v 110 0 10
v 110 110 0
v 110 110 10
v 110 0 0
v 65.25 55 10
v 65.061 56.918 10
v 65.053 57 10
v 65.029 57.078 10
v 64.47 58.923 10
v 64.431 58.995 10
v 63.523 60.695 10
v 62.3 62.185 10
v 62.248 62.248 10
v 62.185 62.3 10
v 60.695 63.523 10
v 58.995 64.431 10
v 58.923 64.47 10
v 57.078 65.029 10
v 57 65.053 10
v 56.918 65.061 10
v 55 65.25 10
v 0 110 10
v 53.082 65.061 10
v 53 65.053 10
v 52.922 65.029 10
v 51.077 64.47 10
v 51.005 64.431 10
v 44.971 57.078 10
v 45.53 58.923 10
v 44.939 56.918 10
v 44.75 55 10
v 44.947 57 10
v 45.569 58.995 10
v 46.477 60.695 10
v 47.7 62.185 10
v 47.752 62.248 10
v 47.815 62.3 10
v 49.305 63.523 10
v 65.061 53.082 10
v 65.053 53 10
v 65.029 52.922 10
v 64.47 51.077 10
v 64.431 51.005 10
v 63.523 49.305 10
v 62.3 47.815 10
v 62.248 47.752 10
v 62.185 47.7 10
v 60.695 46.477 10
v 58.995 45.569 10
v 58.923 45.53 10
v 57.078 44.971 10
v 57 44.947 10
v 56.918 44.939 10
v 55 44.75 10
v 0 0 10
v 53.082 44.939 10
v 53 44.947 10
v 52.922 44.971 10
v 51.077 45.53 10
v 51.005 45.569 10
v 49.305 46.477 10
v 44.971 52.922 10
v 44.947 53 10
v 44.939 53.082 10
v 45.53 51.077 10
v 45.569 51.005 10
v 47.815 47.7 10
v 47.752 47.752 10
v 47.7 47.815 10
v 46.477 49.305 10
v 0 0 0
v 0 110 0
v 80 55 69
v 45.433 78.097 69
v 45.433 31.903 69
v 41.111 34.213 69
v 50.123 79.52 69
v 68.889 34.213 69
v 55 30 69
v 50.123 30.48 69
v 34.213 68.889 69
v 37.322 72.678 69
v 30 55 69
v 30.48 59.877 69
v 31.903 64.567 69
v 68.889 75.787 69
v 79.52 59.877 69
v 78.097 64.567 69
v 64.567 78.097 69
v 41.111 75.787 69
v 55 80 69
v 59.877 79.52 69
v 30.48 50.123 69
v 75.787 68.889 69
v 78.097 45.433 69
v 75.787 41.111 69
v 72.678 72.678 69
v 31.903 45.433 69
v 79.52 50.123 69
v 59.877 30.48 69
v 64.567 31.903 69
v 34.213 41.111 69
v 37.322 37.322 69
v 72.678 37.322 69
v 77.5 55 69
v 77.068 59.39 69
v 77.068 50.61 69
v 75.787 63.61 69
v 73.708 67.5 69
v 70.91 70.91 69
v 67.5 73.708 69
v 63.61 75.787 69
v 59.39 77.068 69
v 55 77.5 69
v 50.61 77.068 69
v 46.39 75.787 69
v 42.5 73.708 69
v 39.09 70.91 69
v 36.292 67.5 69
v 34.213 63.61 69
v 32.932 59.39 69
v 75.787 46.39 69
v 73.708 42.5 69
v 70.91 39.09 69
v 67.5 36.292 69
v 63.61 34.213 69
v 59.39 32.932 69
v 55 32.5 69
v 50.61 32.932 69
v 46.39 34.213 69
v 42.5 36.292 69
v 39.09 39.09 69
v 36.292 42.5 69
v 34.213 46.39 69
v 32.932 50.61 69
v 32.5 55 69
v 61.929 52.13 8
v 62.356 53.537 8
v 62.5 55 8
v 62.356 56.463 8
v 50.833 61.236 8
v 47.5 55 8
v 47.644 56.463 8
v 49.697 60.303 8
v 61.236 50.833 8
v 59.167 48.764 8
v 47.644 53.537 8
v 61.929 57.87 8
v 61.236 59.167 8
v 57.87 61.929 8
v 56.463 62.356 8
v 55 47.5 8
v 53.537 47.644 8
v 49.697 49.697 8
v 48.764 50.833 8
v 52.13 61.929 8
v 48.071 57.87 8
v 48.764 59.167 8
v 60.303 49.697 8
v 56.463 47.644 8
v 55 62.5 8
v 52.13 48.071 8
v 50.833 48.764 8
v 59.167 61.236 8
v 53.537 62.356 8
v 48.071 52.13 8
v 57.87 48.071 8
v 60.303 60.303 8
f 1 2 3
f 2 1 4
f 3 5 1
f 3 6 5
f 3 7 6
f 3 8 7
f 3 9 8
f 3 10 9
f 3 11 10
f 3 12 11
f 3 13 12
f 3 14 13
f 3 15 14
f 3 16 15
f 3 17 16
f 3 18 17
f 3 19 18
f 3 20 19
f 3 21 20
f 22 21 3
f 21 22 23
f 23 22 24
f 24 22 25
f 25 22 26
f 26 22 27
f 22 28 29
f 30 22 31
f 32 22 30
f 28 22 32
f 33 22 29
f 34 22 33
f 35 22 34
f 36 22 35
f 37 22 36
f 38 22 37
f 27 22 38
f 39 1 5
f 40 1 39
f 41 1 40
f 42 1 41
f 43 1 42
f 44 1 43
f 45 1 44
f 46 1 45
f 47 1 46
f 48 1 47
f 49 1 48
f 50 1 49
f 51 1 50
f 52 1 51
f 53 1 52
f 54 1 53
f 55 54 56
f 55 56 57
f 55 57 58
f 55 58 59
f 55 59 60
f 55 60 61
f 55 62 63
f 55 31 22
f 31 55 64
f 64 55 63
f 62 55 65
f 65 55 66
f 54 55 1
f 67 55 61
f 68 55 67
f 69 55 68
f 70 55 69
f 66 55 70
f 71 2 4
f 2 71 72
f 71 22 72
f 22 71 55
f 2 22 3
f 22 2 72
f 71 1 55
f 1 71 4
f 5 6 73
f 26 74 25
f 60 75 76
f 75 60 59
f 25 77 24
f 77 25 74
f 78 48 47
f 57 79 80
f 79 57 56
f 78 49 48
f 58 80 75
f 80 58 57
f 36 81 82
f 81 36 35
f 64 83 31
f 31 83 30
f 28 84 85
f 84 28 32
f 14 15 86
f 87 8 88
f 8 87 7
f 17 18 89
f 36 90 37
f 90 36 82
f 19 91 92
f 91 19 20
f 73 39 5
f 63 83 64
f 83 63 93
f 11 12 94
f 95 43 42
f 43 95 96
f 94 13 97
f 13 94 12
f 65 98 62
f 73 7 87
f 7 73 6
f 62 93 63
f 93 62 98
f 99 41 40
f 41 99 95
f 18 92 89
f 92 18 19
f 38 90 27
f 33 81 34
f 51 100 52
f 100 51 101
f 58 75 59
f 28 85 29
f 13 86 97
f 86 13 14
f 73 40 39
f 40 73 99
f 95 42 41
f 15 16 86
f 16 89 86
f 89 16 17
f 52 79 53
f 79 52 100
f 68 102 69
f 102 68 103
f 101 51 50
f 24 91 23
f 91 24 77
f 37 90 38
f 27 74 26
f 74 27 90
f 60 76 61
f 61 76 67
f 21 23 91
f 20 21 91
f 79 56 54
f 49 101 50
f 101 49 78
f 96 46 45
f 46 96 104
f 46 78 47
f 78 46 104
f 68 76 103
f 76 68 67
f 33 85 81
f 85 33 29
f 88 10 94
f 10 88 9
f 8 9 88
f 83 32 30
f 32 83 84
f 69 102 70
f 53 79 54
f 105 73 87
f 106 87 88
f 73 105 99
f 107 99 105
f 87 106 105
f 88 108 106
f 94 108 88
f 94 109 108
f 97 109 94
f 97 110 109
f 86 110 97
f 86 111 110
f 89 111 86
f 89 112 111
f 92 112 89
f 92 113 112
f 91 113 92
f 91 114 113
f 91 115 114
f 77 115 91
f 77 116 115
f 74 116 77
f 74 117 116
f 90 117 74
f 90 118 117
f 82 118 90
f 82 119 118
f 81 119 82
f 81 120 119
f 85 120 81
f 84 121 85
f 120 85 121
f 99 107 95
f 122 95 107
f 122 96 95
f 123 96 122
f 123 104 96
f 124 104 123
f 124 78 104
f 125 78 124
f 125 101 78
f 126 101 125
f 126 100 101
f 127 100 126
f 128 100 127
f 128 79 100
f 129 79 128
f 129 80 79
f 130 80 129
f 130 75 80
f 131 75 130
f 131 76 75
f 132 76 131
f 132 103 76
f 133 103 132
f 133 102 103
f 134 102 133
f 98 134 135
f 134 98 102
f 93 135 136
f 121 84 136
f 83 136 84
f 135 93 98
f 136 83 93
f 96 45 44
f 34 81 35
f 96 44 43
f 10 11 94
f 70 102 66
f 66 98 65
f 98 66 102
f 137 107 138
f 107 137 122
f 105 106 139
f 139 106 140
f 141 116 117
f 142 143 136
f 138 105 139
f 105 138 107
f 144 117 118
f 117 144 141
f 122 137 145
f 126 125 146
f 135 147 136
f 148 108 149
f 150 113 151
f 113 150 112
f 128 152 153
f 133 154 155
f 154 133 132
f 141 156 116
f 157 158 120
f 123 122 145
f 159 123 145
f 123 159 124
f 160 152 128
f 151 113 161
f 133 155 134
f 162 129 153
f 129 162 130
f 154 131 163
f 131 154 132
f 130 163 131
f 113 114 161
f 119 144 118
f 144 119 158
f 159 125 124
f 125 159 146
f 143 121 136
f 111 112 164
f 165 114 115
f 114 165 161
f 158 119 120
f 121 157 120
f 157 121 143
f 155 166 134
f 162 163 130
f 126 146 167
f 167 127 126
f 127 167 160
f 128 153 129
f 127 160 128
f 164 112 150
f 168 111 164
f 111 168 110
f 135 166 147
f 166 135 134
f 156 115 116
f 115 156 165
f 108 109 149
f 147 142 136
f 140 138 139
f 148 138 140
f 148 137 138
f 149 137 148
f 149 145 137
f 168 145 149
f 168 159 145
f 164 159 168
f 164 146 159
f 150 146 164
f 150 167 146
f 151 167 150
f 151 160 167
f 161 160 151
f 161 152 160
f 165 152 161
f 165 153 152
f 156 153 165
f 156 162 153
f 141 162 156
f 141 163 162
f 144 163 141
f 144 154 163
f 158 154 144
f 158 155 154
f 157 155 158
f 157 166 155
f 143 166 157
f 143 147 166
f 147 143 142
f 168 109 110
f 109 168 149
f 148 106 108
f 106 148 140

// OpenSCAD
$fn = 32;

// ----------------------------------------------------------------------
// Hopper: funnel with square flange
// ----------------------------------------------------------------------

// --- parameters (mm) ---
fl = 110;                 // flange side, X and Y
fl_t = 10;                // flange thickness
cone_h = 60;              // cone height above the flange
top_d = 50;               // cone mouth diameter
bot_d = 20;               // cone spout diameter
wall = 2.5;               // cone wall thickness

bore_d = bot_d - 2 * wall;  // spout bore diameter
total_h = fl_t + cone_h - 1;  // overall height

difference() {
  union() {
    cube([fl, fl, fl_t]);
    translate([fl / 2, fl / 2, fl_t - 1])
      cylinder(h = cone_h, d1 = bot_d, d2 = top_d);
  }
  translate([fl / 2, fl / 2, fl_t - 2])
    cylinder(h = cone_h + 1, d1 = bore_d, d2 = top_d - 2 * wall);
}
